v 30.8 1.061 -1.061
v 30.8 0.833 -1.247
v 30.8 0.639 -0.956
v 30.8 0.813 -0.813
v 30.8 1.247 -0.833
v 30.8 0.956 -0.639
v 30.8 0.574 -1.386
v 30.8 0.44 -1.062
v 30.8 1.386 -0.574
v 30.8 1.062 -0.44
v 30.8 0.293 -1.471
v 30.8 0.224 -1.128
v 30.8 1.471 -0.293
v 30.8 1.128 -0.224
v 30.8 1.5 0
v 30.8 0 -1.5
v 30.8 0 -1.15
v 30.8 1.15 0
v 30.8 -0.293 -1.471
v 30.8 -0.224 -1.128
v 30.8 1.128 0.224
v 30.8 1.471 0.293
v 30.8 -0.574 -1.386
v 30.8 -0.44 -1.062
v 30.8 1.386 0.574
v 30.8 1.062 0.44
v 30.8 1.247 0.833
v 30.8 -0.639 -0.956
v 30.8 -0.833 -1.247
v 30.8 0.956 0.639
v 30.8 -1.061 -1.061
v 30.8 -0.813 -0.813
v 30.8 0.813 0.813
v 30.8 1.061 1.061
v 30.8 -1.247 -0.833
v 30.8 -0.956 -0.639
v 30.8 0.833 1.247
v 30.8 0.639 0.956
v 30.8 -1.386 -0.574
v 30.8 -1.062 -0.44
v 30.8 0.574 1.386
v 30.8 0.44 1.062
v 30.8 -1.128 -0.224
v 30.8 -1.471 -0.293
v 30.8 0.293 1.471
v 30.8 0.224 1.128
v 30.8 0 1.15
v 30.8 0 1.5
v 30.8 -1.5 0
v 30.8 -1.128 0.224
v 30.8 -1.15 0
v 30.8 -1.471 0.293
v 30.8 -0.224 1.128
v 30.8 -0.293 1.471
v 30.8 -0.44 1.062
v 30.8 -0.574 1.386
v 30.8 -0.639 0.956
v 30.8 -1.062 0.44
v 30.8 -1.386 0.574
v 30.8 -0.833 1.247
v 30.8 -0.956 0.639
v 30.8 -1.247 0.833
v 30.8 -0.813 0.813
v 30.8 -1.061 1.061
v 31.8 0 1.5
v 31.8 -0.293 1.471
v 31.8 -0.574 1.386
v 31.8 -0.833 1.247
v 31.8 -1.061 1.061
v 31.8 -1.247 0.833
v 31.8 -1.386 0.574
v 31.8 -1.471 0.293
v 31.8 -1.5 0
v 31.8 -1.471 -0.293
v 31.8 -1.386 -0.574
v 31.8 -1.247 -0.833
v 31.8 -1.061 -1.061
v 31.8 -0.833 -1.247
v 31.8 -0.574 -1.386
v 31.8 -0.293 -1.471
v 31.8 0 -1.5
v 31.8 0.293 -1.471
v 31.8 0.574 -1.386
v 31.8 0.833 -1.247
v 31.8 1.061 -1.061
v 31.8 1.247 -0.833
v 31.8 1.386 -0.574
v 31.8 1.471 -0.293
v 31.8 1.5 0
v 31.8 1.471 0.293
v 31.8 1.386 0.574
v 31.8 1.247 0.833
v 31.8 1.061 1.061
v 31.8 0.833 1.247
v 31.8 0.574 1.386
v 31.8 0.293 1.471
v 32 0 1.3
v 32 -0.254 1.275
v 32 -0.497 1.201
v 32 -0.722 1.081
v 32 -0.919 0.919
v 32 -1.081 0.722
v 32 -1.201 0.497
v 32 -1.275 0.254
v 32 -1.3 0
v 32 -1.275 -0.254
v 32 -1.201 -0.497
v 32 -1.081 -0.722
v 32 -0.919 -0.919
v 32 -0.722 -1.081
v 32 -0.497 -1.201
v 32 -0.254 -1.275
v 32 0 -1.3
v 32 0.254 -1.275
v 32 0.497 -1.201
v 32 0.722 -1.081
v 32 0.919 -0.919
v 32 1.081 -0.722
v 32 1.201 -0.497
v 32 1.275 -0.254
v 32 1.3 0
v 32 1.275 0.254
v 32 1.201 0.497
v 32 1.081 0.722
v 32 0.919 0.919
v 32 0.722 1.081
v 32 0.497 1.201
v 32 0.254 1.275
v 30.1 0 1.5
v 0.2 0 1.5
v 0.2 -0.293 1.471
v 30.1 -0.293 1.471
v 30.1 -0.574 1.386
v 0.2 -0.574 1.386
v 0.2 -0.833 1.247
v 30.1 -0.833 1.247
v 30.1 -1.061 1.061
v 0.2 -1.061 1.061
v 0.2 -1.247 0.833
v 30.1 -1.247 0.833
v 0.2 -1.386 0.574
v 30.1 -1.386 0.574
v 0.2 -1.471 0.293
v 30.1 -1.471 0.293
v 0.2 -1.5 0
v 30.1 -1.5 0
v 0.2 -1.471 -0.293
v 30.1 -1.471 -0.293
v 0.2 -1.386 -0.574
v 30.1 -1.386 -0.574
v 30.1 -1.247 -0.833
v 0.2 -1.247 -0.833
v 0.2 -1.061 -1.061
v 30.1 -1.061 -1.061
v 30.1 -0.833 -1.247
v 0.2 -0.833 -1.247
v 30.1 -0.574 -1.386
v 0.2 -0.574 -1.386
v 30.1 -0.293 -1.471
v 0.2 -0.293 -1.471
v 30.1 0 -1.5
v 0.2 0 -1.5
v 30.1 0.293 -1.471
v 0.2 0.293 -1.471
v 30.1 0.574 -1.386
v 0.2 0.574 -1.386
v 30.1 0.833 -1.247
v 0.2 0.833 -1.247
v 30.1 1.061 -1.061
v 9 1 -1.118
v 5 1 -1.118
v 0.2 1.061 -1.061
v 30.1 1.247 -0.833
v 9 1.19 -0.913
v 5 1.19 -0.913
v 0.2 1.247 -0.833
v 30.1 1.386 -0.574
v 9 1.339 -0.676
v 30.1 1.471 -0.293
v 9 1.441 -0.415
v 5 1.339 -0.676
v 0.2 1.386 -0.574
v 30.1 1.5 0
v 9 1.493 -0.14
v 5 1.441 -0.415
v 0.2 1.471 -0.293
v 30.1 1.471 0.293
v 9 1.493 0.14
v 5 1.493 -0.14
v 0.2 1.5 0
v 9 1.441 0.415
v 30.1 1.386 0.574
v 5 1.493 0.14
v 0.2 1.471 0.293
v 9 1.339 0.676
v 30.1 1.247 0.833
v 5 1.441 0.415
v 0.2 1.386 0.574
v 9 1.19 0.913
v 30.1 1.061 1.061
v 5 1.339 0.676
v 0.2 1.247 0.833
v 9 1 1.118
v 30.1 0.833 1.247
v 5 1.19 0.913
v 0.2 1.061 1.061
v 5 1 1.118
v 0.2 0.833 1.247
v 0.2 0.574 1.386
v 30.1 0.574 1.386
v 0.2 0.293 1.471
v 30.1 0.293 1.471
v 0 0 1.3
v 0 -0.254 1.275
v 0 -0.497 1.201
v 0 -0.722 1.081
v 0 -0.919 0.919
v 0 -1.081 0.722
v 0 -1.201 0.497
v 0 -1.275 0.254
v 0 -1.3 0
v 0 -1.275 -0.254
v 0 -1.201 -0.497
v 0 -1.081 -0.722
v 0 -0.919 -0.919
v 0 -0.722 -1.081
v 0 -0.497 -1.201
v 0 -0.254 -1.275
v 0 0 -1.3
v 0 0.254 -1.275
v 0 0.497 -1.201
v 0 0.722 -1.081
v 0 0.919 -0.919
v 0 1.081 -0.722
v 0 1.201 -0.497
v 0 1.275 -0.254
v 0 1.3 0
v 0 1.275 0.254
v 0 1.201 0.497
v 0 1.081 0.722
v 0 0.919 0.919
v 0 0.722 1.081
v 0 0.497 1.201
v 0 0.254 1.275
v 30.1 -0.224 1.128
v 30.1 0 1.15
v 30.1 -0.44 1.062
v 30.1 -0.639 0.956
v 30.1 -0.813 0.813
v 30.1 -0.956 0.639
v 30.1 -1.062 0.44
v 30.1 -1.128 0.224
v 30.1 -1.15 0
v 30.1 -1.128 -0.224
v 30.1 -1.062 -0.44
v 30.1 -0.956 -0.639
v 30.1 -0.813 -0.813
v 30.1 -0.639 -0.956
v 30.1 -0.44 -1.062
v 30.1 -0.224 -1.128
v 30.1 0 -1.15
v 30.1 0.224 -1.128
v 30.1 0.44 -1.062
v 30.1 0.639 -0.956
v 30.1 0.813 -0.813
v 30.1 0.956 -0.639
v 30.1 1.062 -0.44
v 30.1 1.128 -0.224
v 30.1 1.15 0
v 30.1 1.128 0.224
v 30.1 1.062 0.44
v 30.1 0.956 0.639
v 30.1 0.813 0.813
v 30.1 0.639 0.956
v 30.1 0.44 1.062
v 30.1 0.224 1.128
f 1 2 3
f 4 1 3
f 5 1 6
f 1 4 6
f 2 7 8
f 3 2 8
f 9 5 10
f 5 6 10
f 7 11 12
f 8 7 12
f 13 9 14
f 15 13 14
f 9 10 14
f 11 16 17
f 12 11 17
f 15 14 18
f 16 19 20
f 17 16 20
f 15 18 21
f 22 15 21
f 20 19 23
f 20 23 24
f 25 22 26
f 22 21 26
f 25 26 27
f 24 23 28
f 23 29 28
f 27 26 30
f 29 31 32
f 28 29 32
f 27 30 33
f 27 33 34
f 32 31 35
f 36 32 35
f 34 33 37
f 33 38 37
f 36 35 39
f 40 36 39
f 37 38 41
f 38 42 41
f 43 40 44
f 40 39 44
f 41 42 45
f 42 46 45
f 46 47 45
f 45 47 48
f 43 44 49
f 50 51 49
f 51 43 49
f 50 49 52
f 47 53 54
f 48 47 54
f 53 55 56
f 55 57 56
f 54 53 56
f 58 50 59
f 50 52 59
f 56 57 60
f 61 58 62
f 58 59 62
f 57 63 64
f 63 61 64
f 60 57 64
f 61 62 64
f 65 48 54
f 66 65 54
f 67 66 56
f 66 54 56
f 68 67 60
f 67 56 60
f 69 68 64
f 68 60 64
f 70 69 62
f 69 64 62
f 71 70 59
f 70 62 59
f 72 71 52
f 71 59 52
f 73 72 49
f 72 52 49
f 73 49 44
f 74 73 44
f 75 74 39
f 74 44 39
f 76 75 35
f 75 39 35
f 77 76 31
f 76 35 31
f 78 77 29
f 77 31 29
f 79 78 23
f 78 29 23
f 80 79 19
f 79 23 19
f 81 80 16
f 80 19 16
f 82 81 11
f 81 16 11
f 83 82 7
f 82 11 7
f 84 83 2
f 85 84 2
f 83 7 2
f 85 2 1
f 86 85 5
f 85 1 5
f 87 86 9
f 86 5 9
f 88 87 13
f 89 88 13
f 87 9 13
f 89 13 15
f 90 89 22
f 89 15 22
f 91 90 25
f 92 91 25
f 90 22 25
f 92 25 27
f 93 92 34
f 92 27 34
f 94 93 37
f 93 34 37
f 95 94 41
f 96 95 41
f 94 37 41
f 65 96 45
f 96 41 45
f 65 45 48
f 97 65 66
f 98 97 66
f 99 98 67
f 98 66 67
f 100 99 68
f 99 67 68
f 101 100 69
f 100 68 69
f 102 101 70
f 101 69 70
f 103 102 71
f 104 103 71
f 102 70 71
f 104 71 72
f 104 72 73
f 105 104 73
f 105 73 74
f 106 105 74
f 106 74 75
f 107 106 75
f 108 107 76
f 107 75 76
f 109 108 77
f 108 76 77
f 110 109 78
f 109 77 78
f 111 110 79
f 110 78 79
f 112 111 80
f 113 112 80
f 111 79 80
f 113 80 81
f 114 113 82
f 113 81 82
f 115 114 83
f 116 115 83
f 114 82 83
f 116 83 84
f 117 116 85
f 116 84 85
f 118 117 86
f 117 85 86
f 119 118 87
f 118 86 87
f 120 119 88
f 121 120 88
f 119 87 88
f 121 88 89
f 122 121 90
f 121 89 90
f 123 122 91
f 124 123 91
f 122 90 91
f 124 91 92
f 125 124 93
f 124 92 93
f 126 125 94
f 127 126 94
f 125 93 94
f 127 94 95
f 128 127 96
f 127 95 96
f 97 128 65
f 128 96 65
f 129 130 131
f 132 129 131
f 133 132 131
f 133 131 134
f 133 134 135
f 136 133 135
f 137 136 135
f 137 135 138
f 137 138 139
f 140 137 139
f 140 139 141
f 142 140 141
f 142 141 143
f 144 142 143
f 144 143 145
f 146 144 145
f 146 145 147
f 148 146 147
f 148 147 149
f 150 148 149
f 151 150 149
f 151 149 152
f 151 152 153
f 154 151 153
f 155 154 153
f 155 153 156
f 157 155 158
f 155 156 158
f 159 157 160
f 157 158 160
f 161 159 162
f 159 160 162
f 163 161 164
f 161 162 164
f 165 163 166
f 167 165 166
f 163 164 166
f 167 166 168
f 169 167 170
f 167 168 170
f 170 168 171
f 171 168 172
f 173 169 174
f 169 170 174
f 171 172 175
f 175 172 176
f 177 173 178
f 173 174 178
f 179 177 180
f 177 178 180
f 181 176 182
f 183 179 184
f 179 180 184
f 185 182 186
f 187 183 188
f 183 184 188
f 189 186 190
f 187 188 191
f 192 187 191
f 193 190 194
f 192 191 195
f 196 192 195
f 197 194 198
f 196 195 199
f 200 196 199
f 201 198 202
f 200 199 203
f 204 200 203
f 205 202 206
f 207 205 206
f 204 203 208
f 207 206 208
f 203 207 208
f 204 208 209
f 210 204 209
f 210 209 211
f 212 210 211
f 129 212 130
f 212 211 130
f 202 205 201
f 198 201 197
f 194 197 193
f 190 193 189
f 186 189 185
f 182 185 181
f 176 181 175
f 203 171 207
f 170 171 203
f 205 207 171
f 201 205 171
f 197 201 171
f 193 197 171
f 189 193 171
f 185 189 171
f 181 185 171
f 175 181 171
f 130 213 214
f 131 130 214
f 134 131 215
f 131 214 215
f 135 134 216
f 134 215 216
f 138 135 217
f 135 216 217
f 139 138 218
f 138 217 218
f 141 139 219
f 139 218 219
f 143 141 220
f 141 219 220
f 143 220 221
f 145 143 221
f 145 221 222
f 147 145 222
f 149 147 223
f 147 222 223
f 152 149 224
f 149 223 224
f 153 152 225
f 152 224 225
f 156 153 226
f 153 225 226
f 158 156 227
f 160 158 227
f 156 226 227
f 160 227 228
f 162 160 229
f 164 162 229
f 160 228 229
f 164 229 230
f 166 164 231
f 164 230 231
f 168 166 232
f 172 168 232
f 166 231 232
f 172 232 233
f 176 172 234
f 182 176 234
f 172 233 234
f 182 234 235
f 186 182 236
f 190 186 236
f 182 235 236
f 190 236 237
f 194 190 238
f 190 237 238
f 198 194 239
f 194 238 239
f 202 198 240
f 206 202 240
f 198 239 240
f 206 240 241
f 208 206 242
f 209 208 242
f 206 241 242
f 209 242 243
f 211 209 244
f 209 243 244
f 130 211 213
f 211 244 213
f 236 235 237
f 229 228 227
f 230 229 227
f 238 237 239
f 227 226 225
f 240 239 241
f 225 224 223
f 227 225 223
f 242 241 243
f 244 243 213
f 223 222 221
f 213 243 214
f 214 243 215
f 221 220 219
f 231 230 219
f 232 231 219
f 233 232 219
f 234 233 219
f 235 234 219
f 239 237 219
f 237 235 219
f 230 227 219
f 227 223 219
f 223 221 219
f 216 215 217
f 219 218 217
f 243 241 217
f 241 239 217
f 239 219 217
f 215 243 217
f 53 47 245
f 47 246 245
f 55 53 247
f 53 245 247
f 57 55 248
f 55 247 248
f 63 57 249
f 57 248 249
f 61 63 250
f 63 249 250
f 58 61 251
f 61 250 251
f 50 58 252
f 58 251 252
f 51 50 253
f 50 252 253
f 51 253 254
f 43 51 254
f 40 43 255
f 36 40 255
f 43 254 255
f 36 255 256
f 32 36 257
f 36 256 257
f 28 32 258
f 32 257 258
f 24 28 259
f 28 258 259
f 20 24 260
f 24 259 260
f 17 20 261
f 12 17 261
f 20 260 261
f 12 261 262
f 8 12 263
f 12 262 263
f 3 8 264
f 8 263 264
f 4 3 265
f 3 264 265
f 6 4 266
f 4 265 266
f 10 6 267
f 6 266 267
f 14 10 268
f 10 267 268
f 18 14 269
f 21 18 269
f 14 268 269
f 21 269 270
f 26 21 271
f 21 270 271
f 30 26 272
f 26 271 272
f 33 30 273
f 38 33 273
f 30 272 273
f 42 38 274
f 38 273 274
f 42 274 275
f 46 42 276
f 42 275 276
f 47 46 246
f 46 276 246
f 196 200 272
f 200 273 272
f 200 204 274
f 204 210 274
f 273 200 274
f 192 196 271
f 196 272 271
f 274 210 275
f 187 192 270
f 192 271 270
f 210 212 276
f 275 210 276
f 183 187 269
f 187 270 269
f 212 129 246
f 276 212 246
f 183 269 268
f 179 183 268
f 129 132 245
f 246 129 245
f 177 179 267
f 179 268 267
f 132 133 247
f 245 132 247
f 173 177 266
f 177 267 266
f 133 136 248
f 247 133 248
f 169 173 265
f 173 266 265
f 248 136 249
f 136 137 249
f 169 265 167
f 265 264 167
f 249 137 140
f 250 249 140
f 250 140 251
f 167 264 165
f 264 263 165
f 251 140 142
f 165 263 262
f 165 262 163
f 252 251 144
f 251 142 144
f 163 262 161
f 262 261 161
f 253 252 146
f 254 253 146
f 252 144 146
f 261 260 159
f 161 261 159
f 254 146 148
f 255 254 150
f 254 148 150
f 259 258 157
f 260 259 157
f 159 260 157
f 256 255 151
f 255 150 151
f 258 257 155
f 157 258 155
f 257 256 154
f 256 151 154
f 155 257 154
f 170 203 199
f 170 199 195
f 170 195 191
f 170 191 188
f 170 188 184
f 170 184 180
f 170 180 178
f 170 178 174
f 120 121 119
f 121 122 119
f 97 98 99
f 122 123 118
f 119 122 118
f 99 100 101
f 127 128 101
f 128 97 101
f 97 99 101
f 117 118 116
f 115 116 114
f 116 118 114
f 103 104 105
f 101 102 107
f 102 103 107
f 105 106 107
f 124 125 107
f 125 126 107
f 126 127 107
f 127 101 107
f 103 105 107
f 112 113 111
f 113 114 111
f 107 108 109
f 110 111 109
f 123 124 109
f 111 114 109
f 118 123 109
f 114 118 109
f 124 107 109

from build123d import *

# Parameters (mm, degrees)
CHANFREIN1_SIZE       = 0.2
EXTRUSION1_DEPTH      = 10
EXTRUSION1_DEPTH_BACK = 10
ESQUISSE2_W           = 4
ESQUISSE2_H           = 1.988568473


with BuildPart() as part:
    # Esquisse1 → Révolution1 (revolve)
    with BuildSketch(Plane.XY):
        Polygon((32, 0), (32, 1.5), (30.8, 1.5), (30.8, 1.15), (30.1, 1.15), (30.1, 1.5), (0, 1.5), (0, 0), align=None)
    revolve(axis=Axis((0, 0, 0), (1, 0, 0)))

    # Chanfrein1
    chanfrein1_edges = [part.edges().sort_by_distance(p)[0] for p in [
        (32, -1.5, 0),
        (0, -1.5, 0),
    ]]
    chamfer(chanfrein1_edges, length=CHANFREIN1_SIZE)

    # Esquisse2 → Extrusion1 (cut, two sides: drawn at the far end of the back side and taken through both)
    with BuildSketch(Plane.XY.offset(-EXTRUSION1_DEPTH_BACK)):
        with Locations((7, 1.994284237)):
            Rectangle(ESQUISSE2_W, ESQUISSE2_H)
    extrude(amount=EXTRUSION1_DEPTH + EXTRUSION1_DEPTH_BACK, mode=Mode.SUBTRACT)


solid = part.part
